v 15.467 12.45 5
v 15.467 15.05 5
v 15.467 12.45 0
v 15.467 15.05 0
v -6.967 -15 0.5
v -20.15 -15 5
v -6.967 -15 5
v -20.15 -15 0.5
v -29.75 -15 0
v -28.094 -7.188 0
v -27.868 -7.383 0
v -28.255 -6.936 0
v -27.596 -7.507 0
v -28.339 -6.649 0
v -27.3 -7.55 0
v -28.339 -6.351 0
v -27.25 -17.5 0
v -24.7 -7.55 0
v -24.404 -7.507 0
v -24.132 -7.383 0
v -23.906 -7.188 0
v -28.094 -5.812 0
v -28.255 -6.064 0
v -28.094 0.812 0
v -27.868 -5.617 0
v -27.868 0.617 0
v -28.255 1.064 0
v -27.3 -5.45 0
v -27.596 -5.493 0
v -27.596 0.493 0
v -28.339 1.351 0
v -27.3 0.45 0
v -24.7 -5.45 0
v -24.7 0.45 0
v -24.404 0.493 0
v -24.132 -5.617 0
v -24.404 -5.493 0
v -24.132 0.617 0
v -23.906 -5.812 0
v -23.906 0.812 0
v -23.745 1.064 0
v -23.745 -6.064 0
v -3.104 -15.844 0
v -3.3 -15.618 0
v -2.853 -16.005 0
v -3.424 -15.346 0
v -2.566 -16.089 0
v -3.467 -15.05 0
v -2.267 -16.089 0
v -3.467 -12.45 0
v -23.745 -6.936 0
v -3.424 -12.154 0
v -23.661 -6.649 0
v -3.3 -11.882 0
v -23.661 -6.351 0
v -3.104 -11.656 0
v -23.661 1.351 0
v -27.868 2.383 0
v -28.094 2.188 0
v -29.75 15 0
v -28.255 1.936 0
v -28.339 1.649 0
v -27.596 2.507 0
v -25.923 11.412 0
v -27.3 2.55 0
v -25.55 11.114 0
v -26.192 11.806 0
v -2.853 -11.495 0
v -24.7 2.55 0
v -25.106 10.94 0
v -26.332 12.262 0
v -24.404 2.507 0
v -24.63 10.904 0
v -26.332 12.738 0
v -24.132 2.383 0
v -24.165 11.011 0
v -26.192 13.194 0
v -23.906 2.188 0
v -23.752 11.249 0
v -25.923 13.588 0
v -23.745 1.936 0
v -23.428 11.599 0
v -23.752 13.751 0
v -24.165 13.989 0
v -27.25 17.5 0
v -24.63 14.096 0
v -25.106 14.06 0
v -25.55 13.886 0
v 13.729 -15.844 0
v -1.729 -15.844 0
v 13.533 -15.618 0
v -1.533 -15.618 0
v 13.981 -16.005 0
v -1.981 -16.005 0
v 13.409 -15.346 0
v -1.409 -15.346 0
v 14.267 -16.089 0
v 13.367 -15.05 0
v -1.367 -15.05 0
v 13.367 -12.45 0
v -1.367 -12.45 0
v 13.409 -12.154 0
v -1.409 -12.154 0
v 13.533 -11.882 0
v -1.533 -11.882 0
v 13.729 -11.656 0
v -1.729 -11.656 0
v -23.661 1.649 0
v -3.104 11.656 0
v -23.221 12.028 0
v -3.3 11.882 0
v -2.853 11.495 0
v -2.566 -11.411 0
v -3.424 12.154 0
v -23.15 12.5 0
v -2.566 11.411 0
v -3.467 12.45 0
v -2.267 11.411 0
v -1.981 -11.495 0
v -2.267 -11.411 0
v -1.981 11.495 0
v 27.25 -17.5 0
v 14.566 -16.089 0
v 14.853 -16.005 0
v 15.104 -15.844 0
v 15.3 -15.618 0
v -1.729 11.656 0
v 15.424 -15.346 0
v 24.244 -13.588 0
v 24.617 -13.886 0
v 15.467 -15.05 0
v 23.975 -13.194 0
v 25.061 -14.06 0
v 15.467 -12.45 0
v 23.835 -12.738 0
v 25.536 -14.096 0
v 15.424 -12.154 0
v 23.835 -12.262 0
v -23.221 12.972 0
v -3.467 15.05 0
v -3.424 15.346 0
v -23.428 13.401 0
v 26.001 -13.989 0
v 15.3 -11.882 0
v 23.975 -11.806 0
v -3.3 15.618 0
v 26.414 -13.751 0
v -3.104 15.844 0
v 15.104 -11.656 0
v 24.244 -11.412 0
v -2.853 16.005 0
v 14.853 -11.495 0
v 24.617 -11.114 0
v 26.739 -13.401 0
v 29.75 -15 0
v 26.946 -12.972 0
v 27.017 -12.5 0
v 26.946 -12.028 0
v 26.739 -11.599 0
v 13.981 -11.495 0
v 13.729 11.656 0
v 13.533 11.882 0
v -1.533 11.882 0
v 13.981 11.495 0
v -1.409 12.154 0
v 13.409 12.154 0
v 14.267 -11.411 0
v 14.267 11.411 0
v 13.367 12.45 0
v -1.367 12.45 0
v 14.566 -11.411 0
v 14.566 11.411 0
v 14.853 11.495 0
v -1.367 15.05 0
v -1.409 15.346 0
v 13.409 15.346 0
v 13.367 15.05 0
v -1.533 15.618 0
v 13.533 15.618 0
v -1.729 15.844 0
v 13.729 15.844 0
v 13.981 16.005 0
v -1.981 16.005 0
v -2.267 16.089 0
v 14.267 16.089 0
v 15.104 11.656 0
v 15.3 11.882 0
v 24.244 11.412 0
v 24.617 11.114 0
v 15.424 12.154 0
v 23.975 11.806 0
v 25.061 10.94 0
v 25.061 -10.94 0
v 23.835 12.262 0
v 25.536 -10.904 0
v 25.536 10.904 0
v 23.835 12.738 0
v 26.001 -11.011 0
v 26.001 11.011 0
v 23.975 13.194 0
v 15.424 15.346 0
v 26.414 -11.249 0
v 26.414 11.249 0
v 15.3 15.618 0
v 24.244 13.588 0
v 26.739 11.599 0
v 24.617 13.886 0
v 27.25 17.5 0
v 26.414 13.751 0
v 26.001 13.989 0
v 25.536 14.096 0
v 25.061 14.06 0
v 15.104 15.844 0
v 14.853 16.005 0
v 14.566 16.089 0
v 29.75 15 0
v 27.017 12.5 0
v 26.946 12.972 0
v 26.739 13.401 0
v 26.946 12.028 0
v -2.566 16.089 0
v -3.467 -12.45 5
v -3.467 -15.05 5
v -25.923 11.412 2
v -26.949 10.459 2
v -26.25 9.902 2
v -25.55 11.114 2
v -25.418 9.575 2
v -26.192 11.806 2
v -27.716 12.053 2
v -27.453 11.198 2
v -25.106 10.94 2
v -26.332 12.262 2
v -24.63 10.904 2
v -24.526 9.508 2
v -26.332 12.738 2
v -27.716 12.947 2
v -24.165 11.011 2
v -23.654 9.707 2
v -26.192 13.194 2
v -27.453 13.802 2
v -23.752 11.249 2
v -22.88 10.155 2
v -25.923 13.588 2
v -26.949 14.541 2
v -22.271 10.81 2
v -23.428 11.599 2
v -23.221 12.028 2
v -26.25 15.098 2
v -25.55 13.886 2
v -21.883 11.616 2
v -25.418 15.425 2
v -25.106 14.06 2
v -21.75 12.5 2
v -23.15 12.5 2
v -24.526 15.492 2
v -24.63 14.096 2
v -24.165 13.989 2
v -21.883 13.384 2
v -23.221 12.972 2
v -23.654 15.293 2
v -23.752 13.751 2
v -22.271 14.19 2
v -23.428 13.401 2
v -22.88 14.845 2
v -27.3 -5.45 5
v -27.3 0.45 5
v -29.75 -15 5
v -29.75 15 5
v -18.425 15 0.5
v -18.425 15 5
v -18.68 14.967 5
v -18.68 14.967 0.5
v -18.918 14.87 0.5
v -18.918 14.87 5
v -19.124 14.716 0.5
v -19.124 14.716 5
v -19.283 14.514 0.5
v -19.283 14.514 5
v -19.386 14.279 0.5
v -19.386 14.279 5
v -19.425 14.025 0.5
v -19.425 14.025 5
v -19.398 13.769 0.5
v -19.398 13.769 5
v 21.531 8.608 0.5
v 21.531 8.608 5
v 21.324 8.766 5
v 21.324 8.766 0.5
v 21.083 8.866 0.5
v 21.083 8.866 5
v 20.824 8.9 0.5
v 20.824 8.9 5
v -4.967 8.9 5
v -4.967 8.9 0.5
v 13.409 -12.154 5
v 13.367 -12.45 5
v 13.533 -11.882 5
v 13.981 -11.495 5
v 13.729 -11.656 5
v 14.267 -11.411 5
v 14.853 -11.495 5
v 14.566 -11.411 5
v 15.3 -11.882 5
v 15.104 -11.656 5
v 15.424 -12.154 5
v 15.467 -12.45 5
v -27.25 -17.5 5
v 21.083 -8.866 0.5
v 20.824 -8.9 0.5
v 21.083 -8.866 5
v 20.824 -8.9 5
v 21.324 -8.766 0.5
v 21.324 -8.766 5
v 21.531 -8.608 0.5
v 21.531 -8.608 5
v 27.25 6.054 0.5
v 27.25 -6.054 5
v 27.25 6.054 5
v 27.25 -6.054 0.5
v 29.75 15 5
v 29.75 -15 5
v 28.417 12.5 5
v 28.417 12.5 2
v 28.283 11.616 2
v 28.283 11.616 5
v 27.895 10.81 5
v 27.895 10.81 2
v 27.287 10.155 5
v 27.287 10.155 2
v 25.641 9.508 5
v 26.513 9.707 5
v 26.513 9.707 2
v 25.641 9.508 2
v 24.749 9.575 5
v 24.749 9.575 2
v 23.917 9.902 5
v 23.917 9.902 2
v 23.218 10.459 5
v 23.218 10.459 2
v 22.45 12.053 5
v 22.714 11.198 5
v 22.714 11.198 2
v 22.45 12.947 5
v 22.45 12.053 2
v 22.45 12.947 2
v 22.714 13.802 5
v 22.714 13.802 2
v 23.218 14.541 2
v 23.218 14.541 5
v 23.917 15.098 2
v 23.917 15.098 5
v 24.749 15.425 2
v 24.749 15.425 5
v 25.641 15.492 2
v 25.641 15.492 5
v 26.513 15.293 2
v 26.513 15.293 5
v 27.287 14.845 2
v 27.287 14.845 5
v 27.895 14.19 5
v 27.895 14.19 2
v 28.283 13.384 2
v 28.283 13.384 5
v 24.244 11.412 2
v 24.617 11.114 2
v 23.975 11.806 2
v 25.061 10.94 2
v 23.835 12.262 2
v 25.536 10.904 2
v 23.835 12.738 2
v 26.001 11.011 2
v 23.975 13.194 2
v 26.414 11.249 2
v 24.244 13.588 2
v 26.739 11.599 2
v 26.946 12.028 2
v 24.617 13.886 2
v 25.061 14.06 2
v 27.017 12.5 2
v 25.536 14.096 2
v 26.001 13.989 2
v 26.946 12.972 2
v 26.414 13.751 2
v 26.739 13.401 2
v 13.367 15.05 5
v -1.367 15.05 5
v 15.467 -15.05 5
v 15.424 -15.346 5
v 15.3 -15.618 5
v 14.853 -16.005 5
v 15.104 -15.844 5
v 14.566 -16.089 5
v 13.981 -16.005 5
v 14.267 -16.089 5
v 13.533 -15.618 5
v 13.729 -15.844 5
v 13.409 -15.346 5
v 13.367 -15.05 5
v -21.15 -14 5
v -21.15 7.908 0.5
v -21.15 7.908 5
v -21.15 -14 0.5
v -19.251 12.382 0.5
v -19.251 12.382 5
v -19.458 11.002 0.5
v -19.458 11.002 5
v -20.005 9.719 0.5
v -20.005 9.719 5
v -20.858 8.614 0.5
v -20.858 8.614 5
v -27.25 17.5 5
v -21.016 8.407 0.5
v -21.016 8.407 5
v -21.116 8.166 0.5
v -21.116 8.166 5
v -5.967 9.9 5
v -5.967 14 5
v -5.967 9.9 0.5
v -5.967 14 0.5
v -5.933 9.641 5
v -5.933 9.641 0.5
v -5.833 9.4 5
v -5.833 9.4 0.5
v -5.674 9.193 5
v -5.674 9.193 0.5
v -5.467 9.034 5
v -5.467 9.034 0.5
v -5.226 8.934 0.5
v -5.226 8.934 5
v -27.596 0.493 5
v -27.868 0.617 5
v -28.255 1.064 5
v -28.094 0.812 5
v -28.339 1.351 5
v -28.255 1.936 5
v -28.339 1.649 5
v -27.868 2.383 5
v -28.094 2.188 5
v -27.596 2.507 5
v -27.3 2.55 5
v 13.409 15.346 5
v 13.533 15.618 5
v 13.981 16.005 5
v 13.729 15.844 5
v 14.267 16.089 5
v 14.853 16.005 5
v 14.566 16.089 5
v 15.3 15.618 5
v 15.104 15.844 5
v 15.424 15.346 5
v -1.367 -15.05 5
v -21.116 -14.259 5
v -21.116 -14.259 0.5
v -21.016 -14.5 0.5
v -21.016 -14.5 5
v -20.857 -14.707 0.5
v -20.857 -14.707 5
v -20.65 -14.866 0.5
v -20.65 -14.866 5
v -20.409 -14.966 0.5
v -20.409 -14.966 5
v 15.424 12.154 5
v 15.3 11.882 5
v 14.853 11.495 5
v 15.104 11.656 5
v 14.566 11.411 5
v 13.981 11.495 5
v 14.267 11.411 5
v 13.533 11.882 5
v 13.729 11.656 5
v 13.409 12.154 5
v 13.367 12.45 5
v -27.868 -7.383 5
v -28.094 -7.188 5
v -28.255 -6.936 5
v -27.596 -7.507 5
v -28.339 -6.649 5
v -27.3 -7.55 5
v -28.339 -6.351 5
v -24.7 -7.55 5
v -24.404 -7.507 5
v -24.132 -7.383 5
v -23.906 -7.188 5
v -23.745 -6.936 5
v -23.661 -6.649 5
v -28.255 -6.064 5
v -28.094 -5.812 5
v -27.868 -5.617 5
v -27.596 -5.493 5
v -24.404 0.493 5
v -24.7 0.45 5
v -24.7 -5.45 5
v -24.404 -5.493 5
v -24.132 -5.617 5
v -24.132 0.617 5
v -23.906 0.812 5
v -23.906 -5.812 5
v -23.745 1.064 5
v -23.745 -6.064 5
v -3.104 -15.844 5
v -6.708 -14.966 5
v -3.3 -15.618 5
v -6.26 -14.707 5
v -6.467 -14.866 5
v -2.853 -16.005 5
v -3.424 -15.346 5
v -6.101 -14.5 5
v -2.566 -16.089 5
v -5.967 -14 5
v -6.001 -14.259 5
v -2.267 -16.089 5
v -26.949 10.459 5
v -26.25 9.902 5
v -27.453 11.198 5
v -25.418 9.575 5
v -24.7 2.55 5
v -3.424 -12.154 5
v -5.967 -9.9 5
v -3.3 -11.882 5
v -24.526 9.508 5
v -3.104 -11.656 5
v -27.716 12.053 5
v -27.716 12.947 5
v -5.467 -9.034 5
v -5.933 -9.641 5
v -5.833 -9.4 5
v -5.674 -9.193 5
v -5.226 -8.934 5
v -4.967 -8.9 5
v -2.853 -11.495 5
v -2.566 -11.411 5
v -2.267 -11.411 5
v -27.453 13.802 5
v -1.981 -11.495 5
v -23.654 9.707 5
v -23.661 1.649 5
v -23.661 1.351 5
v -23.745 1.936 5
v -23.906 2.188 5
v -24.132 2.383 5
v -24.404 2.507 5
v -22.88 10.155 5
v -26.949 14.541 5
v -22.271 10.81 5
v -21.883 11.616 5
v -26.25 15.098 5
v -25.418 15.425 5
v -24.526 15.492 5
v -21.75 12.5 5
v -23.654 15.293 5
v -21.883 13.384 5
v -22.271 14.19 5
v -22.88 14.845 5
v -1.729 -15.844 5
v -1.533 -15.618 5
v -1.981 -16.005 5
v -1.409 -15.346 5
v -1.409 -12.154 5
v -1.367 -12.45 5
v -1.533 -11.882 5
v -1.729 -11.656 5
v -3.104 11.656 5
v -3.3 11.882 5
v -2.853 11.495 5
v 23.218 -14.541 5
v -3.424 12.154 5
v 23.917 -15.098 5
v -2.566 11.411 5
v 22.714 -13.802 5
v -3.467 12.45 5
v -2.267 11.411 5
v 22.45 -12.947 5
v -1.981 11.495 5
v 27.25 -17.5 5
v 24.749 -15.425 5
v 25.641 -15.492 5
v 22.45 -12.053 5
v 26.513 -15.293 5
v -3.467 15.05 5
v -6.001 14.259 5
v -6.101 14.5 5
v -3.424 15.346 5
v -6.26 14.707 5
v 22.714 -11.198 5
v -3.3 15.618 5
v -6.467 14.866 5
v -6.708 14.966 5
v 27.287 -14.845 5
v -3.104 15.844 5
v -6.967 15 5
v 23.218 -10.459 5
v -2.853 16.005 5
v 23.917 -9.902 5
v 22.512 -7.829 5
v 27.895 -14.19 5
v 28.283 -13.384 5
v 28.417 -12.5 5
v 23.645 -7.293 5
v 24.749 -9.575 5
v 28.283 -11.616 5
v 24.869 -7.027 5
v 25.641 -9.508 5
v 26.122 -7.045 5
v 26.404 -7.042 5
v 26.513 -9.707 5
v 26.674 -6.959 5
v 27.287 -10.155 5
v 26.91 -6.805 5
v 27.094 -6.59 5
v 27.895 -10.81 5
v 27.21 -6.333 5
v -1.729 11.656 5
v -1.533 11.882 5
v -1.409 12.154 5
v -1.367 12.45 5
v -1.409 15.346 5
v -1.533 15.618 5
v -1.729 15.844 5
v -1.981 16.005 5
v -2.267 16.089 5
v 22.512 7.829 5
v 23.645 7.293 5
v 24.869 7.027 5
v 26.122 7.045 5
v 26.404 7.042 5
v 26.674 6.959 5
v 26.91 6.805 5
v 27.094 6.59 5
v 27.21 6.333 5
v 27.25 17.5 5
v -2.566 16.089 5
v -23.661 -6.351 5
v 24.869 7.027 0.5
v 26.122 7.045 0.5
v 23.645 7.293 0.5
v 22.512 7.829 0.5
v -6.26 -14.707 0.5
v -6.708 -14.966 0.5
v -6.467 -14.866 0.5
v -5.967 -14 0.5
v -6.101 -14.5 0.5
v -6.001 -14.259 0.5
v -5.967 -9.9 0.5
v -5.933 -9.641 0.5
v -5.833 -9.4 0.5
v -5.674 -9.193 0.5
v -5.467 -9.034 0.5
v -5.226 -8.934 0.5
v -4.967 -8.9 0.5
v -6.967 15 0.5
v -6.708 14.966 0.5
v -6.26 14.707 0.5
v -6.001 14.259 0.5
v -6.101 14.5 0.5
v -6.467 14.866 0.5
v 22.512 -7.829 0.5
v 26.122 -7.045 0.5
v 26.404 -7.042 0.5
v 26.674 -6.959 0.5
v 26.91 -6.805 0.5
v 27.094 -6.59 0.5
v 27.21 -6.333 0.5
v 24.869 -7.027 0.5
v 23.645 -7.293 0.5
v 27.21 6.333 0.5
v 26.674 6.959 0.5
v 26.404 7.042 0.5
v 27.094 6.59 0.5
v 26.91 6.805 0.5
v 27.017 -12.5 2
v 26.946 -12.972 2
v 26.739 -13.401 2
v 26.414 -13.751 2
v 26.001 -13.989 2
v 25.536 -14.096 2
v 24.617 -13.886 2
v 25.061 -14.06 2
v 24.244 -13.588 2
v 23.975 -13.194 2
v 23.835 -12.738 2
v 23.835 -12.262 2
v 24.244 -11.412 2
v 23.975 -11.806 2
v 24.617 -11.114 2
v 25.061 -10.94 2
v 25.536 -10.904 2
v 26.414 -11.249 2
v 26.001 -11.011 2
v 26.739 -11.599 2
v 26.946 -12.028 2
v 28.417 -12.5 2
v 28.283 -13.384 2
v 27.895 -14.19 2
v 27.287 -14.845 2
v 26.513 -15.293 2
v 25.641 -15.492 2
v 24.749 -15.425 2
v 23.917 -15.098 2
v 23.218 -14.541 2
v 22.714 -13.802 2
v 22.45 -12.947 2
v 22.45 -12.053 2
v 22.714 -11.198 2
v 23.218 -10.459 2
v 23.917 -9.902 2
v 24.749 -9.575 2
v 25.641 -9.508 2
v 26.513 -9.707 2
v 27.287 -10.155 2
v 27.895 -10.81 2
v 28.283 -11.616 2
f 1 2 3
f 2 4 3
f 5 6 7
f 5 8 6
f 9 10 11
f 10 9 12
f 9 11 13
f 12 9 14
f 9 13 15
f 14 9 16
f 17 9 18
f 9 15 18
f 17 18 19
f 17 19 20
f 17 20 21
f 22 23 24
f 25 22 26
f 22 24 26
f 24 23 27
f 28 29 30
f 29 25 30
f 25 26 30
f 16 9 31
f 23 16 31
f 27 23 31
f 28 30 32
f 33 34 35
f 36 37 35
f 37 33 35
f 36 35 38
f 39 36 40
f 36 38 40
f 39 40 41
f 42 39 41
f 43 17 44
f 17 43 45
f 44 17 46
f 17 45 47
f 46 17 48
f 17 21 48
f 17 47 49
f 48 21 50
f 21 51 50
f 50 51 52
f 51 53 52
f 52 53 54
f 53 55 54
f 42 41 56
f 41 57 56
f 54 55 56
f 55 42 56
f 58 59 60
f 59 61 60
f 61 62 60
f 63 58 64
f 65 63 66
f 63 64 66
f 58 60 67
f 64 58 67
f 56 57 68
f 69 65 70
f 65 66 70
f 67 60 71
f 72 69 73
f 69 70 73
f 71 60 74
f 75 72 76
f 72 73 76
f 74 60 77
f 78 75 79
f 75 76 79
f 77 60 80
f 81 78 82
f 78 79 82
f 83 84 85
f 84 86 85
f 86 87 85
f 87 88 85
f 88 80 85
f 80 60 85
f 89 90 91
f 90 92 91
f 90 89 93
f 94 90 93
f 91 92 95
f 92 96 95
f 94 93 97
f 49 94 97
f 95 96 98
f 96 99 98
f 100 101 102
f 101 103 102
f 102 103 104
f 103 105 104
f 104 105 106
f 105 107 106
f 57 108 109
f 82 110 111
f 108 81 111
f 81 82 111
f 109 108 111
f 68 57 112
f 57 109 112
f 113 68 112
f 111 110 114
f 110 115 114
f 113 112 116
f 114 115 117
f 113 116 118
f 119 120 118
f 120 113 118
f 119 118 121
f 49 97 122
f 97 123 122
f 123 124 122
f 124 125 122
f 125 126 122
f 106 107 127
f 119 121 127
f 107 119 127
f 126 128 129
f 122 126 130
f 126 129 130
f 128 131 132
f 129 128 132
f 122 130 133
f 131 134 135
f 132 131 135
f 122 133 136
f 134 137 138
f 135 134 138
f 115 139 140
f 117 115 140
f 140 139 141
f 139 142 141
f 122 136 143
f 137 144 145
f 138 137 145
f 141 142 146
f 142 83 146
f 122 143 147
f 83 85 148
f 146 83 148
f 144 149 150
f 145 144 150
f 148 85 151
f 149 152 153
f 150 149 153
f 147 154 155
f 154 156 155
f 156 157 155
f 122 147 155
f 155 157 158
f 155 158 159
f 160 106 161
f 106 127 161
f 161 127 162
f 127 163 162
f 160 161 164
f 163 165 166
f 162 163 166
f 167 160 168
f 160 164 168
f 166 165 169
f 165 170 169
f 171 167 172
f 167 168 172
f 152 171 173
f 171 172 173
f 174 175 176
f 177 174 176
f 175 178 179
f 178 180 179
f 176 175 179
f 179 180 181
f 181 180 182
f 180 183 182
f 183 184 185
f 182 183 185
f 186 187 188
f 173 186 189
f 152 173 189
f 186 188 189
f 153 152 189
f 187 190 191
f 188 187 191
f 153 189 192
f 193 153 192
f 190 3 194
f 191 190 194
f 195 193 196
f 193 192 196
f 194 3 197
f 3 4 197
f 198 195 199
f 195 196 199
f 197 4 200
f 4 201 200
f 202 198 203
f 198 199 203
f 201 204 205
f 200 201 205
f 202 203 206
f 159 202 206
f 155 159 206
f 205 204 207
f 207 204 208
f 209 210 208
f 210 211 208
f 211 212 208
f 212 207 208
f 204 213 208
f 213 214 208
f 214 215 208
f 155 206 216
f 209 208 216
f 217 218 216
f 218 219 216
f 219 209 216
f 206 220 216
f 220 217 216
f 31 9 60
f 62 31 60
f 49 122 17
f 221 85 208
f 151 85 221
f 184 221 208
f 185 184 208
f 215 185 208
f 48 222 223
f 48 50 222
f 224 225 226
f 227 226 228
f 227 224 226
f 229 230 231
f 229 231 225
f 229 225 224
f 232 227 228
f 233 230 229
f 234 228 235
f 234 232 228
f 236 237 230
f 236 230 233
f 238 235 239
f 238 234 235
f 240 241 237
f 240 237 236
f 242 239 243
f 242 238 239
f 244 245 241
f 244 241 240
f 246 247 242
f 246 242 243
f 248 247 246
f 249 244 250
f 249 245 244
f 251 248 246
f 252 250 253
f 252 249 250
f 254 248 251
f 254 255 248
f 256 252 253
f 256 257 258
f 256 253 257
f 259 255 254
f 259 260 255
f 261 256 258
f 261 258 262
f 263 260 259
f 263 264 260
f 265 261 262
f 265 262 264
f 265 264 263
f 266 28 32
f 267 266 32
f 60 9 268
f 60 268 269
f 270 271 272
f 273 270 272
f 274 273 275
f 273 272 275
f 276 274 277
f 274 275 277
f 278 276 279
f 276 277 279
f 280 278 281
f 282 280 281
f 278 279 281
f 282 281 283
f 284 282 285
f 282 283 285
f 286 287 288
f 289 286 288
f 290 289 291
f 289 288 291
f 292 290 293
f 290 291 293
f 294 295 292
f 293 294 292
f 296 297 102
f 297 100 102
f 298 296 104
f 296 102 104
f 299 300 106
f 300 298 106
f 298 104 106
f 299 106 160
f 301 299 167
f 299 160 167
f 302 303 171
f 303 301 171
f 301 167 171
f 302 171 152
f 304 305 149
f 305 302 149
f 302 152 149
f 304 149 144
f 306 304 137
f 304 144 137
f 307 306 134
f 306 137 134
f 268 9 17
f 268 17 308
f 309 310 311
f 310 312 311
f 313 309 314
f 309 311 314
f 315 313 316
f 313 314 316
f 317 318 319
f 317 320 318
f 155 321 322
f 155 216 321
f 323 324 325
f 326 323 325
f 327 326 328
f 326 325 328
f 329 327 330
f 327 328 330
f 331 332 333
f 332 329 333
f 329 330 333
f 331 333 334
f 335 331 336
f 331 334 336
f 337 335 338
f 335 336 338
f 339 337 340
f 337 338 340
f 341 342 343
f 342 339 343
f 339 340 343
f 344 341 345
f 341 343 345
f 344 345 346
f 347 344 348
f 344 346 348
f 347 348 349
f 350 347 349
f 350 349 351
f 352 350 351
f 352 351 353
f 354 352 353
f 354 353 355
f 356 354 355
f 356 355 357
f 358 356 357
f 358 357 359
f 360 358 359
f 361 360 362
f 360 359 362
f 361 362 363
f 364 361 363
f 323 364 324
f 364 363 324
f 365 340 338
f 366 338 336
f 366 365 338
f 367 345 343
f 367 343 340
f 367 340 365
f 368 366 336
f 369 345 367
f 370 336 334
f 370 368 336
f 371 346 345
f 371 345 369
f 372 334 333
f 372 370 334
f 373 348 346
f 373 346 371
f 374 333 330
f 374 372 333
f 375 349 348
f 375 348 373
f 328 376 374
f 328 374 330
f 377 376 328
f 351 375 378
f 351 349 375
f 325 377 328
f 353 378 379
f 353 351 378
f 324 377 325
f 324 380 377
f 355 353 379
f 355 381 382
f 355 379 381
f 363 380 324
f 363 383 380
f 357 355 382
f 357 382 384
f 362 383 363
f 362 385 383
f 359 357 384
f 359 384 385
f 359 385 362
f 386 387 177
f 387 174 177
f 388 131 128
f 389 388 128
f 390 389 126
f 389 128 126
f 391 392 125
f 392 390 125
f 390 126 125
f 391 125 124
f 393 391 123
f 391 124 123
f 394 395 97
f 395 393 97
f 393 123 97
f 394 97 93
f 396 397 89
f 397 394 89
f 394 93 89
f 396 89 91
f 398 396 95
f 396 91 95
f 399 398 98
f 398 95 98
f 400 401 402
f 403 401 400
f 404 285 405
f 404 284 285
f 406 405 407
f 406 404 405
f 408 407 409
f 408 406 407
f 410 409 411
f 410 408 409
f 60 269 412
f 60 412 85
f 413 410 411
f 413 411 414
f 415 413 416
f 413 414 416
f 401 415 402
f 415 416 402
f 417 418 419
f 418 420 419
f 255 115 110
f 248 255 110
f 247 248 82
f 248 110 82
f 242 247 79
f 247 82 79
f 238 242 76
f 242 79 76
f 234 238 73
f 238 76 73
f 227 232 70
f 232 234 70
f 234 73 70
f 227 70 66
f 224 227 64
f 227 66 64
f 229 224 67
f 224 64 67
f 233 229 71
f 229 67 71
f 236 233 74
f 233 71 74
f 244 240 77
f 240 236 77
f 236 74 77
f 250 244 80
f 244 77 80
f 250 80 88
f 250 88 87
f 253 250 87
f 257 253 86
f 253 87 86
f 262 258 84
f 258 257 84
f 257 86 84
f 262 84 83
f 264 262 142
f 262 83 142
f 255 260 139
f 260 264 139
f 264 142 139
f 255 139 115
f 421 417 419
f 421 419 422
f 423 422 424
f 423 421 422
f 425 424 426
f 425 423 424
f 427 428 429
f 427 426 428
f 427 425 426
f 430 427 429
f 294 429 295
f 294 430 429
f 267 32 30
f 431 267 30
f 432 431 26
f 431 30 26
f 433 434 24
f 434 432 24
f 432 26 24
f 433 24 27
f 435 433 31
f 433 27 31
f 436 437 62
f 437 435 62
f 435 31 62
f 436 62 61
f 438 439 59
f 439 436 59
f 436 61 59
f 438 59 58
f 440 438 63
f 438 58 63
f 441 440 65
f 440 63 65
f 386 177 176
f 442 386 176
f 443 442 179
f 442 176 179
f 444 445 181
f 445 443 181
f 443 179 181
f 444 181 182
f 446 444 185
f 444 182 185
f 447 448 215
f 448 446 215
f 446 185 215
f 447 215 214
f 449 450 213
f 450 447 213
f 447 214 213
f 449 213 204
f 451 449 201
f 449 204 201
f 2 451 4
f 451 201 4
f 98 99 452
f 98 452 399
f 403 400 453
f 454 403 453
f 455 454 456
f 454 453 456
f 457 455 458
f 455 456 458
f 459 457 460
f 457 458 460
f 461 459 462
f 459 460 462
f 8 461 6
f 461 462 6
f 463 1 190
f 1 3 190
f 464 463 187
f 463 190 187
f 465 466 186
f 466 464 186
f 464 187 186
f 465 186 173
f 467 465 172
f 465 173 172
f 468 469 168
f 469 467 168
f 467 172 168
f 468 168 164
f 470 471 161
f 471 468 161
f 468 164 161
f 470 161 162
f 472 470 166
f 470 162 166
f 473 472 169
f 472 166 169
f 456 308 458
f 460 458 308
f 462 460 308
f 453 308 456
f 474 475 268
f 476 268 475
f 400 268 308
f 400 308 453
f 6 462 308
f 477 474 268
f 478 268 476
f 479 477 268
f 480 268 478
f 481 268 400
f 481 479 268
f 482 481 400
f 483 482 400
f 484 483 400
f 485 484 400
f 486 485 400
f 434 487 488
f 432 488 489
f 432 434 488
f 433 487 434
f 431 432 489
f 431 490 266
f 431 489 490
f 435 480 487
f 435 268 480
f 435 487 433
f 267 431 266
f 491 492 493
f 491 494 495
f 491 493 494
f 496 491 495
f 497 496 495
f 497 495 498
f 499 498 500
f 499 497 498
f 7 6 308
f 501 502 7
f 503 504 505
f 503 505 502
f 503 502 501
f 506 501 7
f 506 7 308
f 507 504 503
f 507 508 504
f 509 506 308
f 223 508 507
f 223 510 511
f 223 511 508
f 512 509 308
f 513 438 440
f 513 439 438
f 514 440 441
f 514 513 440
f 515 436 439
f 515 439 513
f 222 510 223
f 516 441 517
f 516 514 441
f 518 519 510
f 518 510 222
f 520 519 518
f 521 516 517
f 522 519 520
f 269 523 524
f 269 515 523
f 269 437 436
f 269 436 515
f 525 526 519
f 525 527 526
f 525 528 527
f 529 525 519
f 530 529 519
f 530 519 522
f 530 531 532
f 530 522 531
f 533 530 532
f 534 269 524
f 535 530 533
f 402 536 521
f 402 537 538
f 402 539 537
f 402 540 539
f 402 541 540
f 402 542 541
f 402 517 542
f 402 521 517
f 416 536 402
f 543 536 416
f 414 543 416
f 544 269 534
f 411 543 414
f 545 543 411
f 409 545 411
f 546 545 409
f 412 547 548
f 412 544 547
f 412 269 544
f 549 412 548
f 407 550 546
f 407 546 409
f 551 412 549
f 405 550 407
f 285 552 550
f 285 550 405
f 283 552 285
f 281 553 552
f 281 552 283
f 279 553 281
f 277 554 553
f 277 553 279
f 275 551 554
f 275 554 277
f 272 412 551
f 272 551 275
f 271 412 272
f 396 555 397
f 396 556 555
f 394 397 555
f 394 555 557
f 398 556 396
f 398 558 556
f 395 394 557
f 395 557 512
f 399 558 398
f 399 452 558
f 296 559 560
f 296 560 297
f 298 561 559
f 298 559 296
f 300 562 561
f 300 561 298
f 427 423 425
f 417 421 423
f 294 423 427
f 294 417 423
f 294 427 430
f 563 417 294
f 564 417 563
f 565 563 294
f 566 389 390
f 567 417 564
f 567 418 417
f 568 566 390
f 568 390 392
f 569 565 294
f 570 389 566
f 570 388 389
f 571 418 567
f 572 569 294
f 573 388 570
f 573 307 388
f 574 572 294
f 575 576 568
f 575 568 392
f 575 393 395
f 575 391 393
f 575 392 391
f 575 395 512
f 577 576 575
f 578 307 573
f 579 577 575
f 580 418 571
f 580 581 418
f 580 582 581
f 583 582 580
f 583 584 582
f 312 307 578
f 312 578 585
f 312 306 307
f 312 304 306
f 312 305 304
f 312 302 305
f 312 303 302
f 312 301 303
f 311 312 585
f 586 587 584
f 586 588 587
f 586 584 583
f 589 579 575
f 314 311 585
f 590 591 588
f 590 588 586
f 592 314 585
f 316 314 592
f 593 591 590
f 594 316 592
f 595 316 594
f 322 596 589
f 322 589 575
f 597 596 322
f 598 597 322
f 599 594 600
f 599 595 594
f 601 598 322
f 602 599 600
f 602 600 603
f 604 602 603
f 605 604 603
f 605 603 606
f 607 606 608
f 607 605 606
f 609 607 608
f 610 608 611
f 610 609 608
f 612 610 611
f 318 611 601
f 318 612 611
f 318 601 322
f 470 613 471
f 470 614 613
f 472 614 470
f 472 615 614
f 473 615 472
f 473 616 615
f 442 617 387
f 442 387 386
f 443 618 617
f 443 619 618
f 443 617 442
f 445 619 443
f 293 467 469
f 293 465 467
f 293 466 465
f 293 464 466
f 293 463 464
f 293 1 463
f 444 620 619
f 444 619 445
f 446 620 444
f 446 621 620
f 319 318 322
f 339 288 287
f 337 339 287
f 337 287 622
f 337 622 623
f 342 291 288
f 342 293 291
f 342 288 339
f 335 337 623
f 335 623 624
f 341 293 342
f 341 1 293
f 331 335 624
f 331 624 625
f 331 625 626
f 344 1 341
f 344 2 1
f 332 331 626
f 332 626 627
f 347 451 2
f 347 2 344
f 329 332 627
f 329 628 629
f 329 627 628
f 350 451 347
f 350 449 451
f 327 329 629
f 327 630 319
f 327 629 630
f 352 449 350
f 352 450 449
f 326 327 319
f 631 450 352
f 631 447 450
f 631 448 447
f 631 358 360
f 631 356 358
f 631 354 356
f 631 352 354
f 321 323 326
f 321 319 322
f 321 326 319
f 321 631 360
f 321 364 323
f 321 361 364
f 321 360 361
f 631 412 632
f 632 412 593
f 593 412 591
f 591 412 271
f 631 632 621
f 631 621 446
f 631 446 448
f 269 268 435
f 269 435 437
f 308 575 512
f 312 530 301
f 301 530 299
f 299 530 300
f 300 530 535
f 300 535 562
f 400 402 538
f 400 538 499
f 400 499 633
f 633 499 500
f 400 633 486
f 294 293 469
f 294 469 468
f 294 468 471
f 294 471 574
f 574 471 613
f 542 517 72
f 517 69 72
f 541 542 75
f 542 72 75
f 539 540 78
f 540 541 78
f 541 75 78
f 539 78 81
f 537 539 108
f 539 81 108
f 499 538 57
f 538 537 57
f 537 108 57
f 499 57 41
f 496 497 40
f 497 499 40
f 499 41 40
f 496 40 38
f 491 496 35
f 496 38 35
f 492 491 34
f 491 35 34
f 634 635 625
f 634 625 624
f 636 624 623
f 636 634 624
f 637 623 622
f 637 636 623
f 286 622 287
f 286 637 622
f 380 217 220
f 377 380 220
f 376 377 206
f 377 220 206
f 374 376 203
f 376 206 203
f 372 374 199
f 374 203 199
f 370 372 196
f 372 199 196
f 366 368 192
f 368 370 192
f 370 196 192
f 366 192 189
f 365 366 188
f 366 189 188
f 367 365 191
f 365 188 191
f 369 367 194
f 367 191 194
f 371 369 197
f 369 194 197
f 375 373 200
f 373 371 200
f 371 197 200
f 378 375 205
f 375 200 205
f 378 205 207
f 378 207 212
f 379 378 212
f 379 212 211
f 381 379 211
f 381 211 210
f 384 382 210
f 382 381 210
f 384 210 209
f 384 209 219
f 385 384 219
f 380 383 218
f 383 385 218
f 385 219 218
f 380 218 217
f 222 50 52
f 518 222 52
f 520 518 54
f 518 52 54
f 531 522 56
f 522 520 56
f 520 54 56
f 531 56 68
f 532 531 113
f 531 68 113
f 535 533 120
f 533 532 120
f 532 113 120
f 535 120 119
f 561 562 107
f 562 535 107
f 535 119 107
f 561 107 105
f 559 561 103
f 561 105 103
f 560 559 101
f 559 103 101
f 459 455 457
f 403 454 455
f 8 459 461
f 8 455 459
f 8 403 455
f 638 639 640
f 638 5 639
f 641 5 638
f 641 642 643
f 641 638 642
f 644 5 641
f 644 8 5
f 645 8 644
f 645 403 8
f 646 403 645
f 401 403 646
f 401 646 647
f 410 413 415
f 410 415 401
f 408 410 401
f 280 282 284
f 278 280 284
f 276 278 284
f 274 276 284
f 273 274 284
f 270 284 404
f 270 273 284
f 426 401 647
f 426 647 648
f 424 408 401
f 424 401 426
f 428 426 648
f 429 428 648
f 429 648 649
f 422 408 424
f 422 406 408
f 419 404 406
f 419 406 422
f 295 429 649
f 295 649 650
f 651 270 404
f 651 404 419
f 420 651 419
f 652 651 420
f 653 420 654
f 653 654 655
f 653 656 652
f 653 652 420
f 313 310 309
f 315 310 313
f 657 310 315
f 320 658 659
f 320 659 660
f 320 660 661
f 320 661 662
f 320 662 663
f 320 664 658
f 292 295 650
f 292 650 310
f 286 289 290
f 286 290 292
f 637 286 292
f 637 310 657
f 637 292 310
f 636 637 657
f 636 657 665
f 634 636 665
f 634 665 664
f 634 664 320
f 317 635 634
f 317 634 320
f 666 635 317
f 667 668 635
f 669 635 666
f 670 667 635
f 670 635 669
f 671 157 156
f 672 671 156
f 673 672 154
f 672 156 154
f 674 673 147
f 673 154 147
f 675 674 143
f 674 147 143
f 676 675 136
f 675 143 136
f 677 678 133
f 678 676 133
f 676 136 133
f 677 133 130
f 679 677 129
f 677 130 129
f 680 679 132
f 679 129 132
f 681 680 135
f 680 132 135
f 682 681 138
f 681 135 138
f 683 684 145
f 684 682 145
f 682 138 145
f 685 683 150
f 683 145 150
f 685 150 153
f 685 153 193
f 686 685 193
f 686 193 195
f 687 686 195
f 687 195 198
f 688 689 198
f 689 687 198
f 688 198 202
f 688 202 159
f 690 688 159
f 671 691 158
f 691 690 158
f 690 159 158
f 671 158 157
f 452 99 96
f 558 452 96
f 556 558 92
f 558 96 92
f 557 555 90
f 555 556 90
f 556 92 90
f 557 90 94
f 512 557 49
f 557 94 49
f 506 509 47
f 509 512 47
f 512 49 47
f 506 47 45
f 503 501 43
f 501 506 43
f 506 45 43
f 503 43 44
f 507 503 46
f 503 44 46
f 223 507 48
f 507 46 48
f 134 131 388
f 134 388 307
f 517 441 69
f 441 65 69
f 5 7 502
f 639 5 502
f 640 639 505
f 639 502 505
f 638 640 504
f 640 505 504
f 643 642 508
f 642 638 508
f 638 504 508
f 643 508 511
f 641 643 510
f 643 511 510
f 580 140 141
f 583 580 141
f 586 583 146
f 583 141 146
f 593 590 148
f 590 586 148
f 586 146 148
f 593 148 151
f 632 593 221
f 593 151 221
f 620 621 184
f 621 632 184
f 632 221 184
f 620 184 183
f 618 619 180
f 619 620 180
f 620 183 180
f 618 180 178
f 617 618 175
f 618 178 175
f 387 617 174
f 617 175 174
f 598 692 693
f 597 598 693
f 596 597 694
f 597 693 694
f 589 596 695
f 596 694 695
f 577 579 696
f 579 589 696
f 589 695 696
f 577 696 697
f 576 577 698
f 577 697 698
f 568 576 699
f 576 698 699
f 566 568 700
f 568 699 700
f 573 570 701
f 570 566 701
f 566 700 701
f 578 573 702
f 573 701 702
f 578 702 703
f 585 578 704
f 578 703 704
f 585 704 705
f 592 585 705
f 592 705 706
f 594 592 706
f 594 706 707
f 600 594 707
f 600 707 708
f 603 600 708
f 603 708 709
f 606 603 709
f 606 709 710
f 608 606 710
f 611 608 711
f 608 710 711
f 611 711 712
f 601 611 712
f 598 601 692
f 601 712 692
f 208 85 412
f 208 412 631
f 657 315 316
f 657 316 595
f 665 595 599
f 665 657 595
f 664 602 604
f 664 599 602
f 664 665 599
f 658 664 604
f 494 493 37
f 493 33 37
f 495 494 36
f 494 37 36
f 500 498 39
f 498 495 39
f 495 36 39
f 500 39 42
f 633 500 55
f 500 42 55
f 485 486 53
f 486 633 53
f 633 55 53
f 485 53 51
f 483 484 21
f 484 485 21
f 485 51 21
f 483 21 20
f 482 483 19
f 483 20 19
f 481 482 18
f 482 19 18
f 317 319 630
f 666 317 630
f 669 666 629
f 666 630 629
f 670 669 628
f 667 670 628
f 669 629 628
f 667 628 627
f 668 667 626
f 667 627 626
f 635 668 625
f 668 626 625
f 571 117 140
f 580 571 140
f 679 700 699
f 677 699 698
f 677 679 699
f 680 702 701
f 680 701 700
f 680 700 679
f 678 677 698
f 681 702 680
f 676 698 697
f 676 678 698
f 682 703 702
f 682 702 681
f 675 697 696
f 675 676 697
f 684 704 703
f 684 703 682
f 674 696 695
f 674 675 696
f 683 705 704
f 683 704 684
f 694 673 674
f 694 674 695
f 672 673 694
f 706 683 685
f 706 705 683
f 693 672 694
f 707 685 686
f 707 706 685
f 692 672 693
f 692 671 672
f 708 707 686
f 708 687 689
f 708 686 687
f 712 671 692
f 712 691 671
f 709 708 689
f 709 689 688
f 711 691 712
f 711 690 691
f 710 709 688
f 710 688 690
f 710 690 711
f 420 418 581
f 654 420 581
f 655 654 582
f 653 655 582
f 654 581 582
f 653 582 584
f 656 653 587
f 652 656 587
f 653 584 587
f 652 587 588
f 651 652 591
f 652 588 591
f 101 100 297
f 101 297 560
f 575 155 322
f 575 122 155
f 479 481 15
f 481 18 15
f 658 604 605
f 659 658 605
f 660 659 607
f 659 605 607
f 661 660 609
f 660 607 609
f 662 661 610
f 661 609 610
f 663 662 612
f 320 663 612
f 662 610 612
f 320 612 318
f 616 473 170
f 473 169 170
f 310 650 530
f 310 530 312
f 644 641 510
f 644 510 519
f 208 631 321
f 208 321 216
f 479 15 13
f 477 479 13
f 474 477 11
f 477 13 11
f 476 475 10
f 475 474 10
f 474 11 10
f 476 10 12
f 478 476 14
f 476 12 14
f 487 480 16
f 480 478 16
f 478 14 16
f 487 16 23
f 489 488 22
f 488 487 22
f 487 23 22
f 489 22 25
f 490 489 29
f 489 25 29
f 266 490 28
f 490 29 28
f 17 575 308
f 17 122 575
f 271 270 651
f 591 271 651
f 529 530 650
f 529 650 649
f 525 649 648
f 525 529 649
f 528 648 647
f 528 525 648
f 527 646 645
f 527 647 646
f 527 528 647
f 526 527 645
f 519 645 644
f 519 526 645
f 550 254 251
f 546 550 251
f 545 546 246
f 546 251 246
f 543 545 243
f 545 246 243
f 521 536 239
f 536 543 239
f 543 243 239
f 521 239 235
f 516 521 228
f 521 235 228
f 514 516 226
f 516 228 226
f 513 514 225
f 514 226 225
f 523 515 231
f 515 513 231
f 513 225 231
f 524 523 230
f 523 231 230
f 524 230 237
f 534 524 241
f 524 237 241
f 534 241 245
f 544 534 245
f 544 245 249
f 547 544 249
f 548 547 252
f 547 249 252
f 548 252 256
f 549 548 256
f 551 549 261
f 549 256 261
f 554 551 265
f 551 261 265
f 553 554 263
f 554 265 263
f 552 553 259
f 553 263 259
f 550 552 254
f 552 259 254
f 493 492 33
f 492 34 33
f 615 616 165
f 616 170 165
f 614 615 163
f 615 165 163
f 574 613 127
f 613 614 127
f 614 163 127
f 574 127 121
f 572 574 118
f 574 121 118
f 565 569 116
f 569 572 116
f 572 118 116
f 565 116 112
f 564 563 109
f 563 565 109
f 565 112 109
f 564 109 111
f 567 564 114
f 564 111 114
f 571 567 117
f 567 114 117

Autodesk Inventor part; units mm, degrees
ref_plane "YZ Plane" through (0, 0, 0) normal (1, 0, 0) x (0, 1, 0)
ref_plane "XZ Plane" through (0, 0, 0) normal (0, 1, 0) x (-1, 0, 0)
ref_plane "XY Plane" through (0, 0, 0) normal (0, 0, 1) x (1, 0, 0)
sketch "スケッチ1" plane through (0, 0, 0) normal (0, 0, 1) x (1, 0, 0)
  line L0 (29.75, 17.5) -> (29.75, -17.5)
  line L1 (29.75, -17.5) -> (-29.75, -17.5)
  line L2 (-29.75, -17.5) -> (-29.75, 17.5)
  line L3 (-29.75, 17.5) -> (29.75, -17.5) construction
  line L4 (29.75, 17.5) -> (-29.75, -17.5) construction
  line L5 (-3.4667, -15.05) -> (-1.3667, -15.05) construction
  line L6 (15.4667, -15.05) -> (15.4667, -12.45)
  line L7 (15.4667, -12.45) -> (13.3667, -12.45) construction
  line L8 (-3.4667, -12.45) -> (-3.4667, -15.05)
  line L9 (-3.4667, -15.05) -> (15.4667, -12.45) construction
  line L10 (15.4667, -15.05) -> (-3.4667, -12.45) construction
  line L11 (-3.4167, -12.5) -> (15.4167, -12.5) construction
  line L12 (15.4167, -12.5) -> (15.4167, -15) construction
  line L13 (15.4167, -15) -> (-3.4167, -15) construction
  line L14 (-3.4167, -15) -> (-3.4167, -12.5) construction
  line L15 (-3.4167, -12.5) -> (15.4167, -15) construction
  line L16 (15.4167, -12.5) -> (-3.4167, -15) construction
  arc A0 (-1.3667, -12.45) -> (-3.4667, -12.45) centre (-2.4167, -12.45) ccw
  line L17 (-3.4667, -13.75) -> (15.4667, -13.75) construction
  arc A1 (-3.4667, -15.05) -> (-1.3667, -15.05) centre (-2.4167, -15.05) ccw
  line L18 (-1.3667, -12.45) -> (-3.4667, -12.45) construction
  line L19 (-1.3667, -15.05) -> (13.3667, -15.05)
  line L20 (13.3667, -12.45) -> (-1.3667, -12.45)
  line L21 (13.3667, -15.05) -> (15.4667, -15.05) construction
  line L22 (-29.75, 17.5) -> (29.75, 17.5)
  line L23 (6, 17.5) -> (6, -17.5) construction
  line L24 (-29.75, 0) -> (29.75, 0) construction
  arc A2 (15.4667, -12.45) -> (13.3667, -12.45) centre (14.4167, -12.45) ccw
  arc A3 (13.3667, -15.05) -> (15.4667, -15.05) centre (14.4167, -15.05) ccw
  line L25 (-3.4667, 15.05) -> (-1.3667, 15.05) construction
  line L26 (15.4667, 15.05) -> (15.4667, 12.45)
  line L27 (15.4667, 12.45) -> (13.3667, 12.45) construction
  line L28 (-3.4667, 12.45) -> (-3.4667, 15.05)
  line L29 (-3.4667, 15.05) -> (15.4667, 12.45) construction
  line L30 (15.4667, 15.05) -> (-3.4667, 12.45) construction
  line L31 (-3.4167, 12.5) -> (15.4167, 12.5) construction
  line L32 (15.4167, 12.5) -> (15.4167, 15) construction
  line L33 (15.4167, 15) -> (-3.4167, 15) construction
  line L34 (-3.4167, 15) -> (-3.4167, 12.5) construction
  line L35 (-3.4167, 12.5) -> (15.4167, 15) construction
  line L36 (15.4167, 12.5) -> (-3.4167, 15) construction
  arc A4 (-3.4667, 12.45) -> (-1.3667, 12.45) centre (-2.4167, 12.45) ccw
  line L37 (-3.4667, 13.75) -> (15.4667, 13.75) construction
  arc A5 (-1.3667, 15.05) -> (-3.4667, 15.05) centre (-2.4167, 15.05) ccw
  line L38 (-1.3667, 12.45) -> (-3.4667, 12.45) construction
  line L39 (-1.3667, 15.05) -> (13.3667, 15.05)
  line L40 (13.3667, 12.45) -> (-1.3667, 12.45)
  line L41 (13.3667, 15.05) -> (15.4667, 15.05) construction
  arc A6 (15.4667, 15.05) -> (13.3667, 15.05) centre (14.4167, 15.05) ccw
  arc A7 (13.3667, 12.45) -> (15.4667, 12.45) centre (14.4167, 12.45) ccw
  circle A8 centre (25.4167, -12.5) radius 1.6
  circle A9 centre (25.4167, -12.5) radius 3
  circle A10 centre (25.4167, 12.5) radius 1.6
  circle A11 centre (25.4167, 12.5) radius 3
  circle A12 centre (-24.75, 12.5) radius 1.6
  circle A13 centre (-24.75, 12.5) radius 3
  line L42 (-5.9667, -15) -> (-5.9667, -8.9)
  line L43 (-5.9667, -8.9) -> (21.2585, -8.9)
  line L44 (27.25, -7.3146) -> (27.25, 7.3146)
  line L45 (-19.851, 15) -> (-5.9167, 15)
  arc A14 (-21.15, 8.3419) -> (-19.851, 15) centre (-24.75, 12.5) ccw
  line L46 (-27.25, 2.5) -> (-24.75, 2.5) construction
  line L47 (-24.75, 2.5) -> (-24.75, -7.5) construction
  line L48 (-24.75, -7.5) -> (-27.25, -7.5) construction
  line L49 (-27.25, -7.5) -> (-27.25, 2.5) construction
  line L50 (-27.25, 2.5) -> (-24.75, -7.5) construction
  line L51 (-24.75, 2.5) -> (-27.25, -7.5) construction
  line L52 (-27.3, 2.55) -> (-24.7, 2.55)
  line L53 (-24.7, 2.55) -> (-24.7, -7.55)
  line L54 (-24.7, -7.55) -> (-27.3, -7.55)
  line L55 (-27.3, -7.55) -> (-27.3, 2.55)
  line L56 (-27.3, 2.55) -> (-24.7, -7.55) construction
  line L57 (-24.7, 2.55) -> (-27.3, -7.55) construction
  arc A15 (-27.3, 2.55) -> (-27.3, 0.45) centre (-27.3, 1.5) ccw
  line L58 (-26, 2.55) -> (-26, -7.55) construction
  line L59 (-27.3, -2.5) -> (-24.7, -2.5) construction
  arc A16 (-24.7, 0.45) -> (-24.7, 2.55) centre (-24.7, 1.5) ccw
  arc A17 (-27.3, -5.45) -> (-27.3, -7.55) centre (-27.3, -6.5) ccw
  arc A18 (-24.7, -7.55) -> (-24.7, -5.45) centre (-24.7, -6.5) ccw
  line L60 (-21.15, 8.3419) -> (-21.15, -15)
  line L61 (-5.9667, 15) -> (-5.9667, 8.9)
  line L62 (-21.15, -15) -> (-5.9667, -15)
  arc A19 (27.25, -7.3146) -> (21.2585, -8.9) centre (25.4167, -12.5) ccw
  line L63 (-5.9667, 8.9) -> (21.2585, 8.9)
  arc A20 (21.2585, 8.9) -> (27.25, 7.3146) centre (25.4167, 12.5) ccw
  point P0 (0, 0)
  point P1 (6, -13.75)
  point P2 (6, -13.75)
  point P3 (6, -13.75)
  point P4 (6, 13.75)
  point P5 (6, 13.75)
  point P6 (6, 13.75)
  point P7 (-26, -2.5)
  point P8 (-27.3, -5.45)
  point P9 (-24.7, 0.45)
  point P10 (-24.7, -5.45)
  point P11 (-5.9667, 15)
  point P12 (27.25, 7.3146)
  dimension "d0" = 59.5
  dimension "d1" = 35
  dimension "d6" = 18.8333
  dimension "d7" = 0.05
  dimension "d8" = 0.05
  dimension "d9" = 1.05
  dimension "d26" = 35.75
  dimension "d27" = 5
  dimension "d31" = 3.2
  dimension "d32" = 6
  dimension "d33" = 5
  dimension "d34" = 10
  dimension "d39" = 5
  dimension "d40" = 5
  dimension "d41" = 3.2
  dimension "d42" = 6
  dimension "d43" = 2.5
  dimension "d50" = 2.5
  dimension "d51" = 2.5
  dimension "d54" = 2.5
  dimension "d56" = 2.5
  dimension "d60" = 1.05
  dimension "d61" = 0.05
  dimension "d62" = 0.05
  dimension "d63" = 2.5
  dimension "d64" = 2.5
  dimension "d65" = 10
  dimension "d68" = 2.5
  dimension "d71" = 2.5
  dimension "d75" = 10
  dimension "d76" = 2.5
  dimension "d77" = 2.5
extrude "押し出し1" add sketch "スケッチ1" along normal blind 5 contours L0 L1 L2 L22
extrude "押し出し2" add sketch "スケッチ1" along normal blind 2 contours A9 | A11 | A13
chamfer "面取り1" distance 2.5 angle 45 4 edges at (-29.75, 17.5, 2.5) (-29.75, -17.5, 2.5) (29.75, 17.5, 2.5) (29.75, -17.5, 2.5)
extrude "押し出し3" add sketch "スケッチ1" along normal blind 0.5 contours L62 L60 A14 L45 L61 L63 A20 L44 A19 L43 L42
fillet "フィレット1" radius 1 11 edges at (-19.851, 15, 2.75) (-21.15, 8.3419, 2.75) (-5.9667, -8.9, 2.75) (-5.9667, 15, 2.75) (-5.9667, -15, 2.75) (-21.15, -15, 2.75) (21.2585, 8.9, 2.75) (27.25, 7.3146, 2.75) (27.25, -7.3146, 2.75) (21.2585, -8.9, 2.75) (-5.9667, 8.9, 2.75)
equation "\"d6\" = d4"
equation "\"d8\" = d7"
equation "\"d41\" = d31"
equation "\"d42\" = d32"
equation "\"d50\" = d49"
equation "\"d60\" = d9"
equation "\"d61\" = d7"
equation "\"d62\" = d61"
equation "\"d4\" = 18.833333"
equation "\"d49\" = 2.5"
properties part number "Cockpit_vertical_frame_05" material "アセタール樹脂、黒"
